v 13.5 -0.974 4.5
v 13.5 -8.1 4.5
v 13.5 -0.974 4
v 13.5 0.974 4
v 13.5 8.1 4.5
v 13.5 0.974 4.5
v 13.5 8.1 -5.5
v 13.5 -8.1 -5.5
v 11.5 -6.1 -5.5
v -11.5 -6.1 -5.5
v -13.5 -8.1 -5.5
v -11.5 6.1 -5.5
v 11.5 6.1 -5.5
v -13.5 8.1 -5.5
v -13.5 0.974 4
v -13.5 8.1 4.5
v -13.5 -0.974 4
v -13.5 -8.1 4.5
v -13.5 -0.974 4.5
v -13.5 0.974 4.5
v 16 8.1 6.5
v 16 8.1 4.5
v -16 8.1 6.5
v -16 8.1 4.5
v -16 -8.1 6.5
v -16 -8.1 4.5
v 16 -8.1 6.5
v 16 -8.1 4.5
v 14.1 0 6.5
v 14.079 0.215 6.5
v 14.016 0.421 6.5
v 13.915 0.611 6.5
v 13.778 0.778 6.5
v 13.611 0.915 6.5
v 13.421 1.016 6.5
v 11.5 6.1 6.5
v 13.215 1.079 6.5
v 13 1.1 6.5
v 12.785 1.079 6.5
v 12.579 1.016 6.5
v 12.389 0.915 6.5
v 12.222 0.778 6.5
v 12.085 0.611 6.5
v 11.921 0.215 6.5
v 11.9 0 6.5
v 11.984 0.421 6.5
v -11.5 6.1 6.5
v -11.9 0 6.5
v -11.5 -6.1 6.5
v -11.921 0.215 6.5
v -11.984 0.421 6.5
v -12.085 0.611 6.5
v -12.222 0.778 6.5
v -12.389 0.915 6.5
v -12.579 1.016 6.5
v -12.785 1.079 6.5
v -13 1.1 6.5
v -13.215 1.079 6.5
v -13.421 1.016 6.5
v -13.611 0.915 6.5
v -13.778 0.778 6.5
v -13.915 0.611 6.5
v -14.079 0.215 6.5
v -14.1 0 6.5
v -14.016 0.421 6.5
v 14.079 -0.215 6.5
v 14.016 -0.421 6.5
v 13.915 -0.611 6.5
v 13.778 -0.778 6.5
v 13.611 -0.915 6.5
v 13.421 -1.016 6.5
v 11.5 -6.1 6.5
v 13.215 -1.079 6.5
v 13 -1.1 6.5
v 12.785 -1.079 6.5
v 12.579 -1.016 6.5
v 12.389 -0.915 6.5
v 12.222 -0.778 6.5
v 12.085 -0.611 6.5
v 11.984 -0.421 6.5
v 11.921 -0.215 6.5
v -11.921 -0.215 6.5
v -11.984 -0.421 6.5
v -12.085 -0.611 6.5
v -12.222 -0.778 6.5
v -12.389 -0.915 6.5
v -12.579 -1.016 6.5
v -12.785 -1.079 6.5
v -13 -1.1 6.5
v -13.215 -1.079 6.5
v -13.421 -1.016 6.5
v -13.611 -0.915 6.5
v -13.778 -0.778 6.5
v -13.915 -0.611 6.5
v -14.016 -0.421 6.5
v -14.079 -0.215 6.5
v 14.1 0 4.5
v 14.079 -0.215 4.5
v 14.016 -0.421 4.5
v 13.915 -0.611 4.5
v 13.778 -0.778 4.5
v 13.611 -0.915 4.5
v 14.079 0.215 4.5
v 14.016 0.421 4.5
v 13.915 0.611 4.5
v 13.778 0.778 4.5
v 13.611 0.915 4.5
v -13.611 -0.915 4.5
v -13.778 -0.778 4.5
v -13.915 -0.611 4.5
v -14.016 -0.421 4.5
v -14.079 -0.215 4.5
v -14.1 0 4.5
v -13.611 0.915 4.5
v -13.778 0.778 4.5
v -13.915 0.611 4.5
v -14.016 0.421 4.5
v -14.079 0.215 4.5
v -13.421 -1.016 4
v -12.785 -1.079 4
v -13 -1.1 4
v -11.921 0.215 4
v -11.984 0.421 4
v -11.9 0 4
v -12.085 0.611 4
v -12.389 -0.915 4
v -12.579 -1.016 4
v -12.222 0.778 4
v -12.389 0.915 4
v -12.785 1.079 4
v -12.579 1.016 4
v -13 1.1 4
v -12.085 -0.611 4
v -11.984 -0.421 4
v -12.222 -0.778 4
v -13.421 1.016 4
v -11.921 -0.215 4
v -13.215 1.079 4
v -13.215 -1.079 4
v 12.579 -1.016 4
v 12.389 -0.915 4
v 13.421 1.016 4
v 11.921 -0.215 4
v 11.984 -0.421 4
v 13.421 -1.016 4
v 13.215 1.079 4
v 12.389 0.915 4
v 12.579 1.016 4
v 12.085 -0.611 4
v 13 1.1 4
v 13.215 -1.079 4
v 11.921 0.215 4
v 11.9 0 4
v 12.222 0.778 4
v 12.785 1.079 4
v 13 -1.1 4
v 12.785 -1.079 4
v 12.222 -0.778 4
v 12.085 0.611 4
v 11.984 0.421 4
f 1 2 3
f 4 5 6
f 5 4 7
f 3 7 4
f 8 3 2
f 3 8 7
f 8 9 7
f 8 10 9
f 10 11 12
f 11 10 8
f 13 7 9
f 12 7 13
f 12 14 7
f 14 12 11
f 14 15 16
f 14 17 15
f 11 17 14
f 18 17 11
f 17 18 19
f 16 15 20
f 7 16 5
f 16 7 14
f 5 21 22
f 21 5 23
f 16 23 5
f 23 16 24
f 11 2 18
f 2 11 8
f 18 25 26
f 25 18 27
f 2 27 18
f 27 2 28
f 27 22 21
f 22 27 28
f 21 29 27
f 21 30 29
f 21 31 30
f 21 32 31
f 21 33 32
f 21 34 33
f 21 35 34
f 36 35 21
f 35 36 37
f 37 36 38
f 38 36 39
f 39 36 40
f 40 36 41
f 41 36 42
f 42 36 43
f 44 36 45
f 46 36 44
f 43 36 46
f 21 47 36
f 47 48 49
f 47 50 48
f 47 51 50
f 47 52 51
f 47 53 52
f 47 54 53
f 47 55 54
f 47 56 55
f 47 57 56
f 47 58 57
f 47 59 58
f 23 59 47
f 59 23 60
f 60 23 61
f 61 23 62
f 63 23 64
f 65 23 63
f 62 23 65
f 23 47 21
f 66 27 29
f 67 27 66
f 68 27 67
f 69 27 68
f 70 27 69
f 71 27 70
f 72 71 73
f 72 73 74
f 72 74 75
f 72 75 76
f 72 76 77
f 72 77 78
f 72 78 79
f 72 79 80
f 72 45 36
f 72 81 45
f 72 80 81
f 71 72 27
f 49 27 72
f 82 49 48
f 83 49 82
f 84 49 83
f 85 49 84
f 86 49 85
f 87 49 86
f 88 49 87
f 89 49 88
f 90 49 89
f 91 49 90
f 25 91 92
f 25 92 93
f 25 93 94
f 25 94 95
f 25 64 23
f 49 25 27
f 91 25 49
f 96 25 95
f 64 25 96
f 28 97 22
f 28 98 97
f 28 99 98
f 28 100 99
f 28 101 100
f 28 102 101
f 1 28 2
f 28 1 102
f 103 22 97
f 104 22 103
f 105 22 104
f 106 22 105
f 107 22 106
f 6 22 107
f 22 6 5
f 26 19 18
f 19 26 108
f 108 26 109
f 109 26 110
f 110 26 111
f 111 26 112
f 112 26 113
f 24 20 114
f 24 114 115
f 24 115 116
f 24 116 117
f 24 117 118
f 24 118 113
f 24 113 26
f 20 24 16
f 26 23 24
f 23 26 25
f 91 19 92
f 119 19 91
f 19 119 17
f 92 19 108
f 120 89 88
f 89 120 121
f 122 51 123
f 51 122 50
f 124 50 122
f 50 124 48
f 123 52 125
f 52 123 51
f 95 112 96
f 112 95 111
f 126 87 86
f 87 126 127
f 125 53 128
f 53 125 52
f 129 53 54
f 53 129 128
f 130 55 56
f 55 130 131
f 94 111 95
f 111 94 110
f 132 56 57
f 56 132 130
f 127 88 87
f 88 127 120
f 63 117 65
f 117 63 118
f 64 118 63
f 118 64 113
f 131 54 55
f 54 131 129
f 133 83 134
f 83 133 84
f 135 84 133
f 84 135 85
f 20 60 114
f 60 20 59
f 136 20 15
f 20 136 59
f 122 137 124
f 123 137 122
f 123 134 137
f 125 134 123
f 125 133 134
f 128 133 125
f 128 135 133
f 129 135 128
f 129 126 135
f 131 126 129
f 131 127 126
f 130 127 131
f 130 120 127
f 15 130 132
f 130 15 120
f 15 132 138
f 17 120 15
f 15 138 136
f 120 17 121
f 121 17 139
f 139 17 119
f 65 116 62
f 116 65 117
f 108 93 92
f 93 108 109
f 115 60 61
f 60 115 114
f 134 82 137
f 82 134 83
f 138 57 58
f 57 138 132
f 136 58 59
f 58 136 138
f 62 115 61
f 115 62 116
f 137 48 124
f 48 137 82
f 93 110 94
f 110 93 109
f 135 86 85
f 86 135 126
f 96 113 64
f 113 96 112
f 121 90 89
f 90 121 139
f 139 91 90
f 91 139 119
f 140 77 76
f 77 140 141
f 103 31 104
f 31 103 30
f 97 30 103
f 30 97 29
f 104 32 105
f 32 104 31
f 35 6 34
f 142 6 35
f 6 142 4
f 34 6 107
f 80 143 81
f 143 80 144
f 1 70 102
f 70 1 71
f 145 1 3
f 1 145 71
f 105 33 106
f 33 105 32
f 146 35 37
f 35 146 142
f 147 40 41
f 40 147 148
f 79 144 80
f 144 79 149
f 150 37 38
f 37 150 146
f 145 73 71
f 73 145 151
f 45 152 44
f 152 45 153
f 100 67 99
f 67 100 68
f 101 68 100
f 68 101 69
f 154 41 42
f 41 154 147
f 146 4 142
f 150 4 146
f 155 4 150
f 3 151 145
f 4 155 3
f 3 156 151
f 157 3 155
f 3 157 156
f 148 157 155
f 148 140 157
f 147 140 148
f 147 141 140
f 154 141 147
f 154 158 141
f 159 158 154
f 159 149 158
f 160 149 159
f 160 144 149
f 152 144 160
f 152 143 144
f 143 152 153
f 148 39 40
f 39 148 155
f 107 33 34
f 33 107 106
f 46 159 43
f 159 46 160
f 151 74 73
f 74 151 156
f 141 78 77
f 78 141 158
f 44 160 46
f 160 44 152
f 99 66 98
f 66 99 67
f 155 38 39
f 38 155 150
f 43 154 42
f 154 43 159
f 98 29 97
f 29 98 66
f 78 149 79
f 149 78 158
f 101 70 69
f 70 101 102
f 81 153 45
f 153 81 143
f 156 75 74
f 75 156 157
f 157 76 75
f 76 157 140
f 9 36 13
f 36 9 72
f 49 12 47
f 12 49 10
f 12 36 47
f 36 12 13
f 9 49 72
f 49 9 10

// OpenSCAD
// SG90 Micro Servo Bracket
// SG90: 23mm x 12.2mm x 22mm, mounting tabs
servo_length = 23;
servo_width = 12.2;
servo_height = 22;
tab_width = 32;  // Including mounting tabs
wall = 2;

difference() {
    union() {
        // Main bracket body
        cube([servo_length + wall*2, servo_width + wall*2, servo_height/2], center=true);

        // Top plate for horn clearance
        translate([0, 0, servo_height/4])
            cube([tab_width, servo_width + wall*2, wall], center=true);
    }

    // Servo pocket
    translate([0, 0, wall])
        cube([servo_length, servo_width, servo_height], center=true);

    // Horn slot
    translate([0, 0, servo_height/4])
        cylinder(d=8, h=wall+1, center=true, $fn=32);

    // Mounting holes on tabs
    for (x = [-1, 1]) {
        translate([x * (tab_width/2 - 3), 0, servo_height/4])
            cylinder(d=2.2, h=wall+1, center=true, $fn=32);
    }
}
